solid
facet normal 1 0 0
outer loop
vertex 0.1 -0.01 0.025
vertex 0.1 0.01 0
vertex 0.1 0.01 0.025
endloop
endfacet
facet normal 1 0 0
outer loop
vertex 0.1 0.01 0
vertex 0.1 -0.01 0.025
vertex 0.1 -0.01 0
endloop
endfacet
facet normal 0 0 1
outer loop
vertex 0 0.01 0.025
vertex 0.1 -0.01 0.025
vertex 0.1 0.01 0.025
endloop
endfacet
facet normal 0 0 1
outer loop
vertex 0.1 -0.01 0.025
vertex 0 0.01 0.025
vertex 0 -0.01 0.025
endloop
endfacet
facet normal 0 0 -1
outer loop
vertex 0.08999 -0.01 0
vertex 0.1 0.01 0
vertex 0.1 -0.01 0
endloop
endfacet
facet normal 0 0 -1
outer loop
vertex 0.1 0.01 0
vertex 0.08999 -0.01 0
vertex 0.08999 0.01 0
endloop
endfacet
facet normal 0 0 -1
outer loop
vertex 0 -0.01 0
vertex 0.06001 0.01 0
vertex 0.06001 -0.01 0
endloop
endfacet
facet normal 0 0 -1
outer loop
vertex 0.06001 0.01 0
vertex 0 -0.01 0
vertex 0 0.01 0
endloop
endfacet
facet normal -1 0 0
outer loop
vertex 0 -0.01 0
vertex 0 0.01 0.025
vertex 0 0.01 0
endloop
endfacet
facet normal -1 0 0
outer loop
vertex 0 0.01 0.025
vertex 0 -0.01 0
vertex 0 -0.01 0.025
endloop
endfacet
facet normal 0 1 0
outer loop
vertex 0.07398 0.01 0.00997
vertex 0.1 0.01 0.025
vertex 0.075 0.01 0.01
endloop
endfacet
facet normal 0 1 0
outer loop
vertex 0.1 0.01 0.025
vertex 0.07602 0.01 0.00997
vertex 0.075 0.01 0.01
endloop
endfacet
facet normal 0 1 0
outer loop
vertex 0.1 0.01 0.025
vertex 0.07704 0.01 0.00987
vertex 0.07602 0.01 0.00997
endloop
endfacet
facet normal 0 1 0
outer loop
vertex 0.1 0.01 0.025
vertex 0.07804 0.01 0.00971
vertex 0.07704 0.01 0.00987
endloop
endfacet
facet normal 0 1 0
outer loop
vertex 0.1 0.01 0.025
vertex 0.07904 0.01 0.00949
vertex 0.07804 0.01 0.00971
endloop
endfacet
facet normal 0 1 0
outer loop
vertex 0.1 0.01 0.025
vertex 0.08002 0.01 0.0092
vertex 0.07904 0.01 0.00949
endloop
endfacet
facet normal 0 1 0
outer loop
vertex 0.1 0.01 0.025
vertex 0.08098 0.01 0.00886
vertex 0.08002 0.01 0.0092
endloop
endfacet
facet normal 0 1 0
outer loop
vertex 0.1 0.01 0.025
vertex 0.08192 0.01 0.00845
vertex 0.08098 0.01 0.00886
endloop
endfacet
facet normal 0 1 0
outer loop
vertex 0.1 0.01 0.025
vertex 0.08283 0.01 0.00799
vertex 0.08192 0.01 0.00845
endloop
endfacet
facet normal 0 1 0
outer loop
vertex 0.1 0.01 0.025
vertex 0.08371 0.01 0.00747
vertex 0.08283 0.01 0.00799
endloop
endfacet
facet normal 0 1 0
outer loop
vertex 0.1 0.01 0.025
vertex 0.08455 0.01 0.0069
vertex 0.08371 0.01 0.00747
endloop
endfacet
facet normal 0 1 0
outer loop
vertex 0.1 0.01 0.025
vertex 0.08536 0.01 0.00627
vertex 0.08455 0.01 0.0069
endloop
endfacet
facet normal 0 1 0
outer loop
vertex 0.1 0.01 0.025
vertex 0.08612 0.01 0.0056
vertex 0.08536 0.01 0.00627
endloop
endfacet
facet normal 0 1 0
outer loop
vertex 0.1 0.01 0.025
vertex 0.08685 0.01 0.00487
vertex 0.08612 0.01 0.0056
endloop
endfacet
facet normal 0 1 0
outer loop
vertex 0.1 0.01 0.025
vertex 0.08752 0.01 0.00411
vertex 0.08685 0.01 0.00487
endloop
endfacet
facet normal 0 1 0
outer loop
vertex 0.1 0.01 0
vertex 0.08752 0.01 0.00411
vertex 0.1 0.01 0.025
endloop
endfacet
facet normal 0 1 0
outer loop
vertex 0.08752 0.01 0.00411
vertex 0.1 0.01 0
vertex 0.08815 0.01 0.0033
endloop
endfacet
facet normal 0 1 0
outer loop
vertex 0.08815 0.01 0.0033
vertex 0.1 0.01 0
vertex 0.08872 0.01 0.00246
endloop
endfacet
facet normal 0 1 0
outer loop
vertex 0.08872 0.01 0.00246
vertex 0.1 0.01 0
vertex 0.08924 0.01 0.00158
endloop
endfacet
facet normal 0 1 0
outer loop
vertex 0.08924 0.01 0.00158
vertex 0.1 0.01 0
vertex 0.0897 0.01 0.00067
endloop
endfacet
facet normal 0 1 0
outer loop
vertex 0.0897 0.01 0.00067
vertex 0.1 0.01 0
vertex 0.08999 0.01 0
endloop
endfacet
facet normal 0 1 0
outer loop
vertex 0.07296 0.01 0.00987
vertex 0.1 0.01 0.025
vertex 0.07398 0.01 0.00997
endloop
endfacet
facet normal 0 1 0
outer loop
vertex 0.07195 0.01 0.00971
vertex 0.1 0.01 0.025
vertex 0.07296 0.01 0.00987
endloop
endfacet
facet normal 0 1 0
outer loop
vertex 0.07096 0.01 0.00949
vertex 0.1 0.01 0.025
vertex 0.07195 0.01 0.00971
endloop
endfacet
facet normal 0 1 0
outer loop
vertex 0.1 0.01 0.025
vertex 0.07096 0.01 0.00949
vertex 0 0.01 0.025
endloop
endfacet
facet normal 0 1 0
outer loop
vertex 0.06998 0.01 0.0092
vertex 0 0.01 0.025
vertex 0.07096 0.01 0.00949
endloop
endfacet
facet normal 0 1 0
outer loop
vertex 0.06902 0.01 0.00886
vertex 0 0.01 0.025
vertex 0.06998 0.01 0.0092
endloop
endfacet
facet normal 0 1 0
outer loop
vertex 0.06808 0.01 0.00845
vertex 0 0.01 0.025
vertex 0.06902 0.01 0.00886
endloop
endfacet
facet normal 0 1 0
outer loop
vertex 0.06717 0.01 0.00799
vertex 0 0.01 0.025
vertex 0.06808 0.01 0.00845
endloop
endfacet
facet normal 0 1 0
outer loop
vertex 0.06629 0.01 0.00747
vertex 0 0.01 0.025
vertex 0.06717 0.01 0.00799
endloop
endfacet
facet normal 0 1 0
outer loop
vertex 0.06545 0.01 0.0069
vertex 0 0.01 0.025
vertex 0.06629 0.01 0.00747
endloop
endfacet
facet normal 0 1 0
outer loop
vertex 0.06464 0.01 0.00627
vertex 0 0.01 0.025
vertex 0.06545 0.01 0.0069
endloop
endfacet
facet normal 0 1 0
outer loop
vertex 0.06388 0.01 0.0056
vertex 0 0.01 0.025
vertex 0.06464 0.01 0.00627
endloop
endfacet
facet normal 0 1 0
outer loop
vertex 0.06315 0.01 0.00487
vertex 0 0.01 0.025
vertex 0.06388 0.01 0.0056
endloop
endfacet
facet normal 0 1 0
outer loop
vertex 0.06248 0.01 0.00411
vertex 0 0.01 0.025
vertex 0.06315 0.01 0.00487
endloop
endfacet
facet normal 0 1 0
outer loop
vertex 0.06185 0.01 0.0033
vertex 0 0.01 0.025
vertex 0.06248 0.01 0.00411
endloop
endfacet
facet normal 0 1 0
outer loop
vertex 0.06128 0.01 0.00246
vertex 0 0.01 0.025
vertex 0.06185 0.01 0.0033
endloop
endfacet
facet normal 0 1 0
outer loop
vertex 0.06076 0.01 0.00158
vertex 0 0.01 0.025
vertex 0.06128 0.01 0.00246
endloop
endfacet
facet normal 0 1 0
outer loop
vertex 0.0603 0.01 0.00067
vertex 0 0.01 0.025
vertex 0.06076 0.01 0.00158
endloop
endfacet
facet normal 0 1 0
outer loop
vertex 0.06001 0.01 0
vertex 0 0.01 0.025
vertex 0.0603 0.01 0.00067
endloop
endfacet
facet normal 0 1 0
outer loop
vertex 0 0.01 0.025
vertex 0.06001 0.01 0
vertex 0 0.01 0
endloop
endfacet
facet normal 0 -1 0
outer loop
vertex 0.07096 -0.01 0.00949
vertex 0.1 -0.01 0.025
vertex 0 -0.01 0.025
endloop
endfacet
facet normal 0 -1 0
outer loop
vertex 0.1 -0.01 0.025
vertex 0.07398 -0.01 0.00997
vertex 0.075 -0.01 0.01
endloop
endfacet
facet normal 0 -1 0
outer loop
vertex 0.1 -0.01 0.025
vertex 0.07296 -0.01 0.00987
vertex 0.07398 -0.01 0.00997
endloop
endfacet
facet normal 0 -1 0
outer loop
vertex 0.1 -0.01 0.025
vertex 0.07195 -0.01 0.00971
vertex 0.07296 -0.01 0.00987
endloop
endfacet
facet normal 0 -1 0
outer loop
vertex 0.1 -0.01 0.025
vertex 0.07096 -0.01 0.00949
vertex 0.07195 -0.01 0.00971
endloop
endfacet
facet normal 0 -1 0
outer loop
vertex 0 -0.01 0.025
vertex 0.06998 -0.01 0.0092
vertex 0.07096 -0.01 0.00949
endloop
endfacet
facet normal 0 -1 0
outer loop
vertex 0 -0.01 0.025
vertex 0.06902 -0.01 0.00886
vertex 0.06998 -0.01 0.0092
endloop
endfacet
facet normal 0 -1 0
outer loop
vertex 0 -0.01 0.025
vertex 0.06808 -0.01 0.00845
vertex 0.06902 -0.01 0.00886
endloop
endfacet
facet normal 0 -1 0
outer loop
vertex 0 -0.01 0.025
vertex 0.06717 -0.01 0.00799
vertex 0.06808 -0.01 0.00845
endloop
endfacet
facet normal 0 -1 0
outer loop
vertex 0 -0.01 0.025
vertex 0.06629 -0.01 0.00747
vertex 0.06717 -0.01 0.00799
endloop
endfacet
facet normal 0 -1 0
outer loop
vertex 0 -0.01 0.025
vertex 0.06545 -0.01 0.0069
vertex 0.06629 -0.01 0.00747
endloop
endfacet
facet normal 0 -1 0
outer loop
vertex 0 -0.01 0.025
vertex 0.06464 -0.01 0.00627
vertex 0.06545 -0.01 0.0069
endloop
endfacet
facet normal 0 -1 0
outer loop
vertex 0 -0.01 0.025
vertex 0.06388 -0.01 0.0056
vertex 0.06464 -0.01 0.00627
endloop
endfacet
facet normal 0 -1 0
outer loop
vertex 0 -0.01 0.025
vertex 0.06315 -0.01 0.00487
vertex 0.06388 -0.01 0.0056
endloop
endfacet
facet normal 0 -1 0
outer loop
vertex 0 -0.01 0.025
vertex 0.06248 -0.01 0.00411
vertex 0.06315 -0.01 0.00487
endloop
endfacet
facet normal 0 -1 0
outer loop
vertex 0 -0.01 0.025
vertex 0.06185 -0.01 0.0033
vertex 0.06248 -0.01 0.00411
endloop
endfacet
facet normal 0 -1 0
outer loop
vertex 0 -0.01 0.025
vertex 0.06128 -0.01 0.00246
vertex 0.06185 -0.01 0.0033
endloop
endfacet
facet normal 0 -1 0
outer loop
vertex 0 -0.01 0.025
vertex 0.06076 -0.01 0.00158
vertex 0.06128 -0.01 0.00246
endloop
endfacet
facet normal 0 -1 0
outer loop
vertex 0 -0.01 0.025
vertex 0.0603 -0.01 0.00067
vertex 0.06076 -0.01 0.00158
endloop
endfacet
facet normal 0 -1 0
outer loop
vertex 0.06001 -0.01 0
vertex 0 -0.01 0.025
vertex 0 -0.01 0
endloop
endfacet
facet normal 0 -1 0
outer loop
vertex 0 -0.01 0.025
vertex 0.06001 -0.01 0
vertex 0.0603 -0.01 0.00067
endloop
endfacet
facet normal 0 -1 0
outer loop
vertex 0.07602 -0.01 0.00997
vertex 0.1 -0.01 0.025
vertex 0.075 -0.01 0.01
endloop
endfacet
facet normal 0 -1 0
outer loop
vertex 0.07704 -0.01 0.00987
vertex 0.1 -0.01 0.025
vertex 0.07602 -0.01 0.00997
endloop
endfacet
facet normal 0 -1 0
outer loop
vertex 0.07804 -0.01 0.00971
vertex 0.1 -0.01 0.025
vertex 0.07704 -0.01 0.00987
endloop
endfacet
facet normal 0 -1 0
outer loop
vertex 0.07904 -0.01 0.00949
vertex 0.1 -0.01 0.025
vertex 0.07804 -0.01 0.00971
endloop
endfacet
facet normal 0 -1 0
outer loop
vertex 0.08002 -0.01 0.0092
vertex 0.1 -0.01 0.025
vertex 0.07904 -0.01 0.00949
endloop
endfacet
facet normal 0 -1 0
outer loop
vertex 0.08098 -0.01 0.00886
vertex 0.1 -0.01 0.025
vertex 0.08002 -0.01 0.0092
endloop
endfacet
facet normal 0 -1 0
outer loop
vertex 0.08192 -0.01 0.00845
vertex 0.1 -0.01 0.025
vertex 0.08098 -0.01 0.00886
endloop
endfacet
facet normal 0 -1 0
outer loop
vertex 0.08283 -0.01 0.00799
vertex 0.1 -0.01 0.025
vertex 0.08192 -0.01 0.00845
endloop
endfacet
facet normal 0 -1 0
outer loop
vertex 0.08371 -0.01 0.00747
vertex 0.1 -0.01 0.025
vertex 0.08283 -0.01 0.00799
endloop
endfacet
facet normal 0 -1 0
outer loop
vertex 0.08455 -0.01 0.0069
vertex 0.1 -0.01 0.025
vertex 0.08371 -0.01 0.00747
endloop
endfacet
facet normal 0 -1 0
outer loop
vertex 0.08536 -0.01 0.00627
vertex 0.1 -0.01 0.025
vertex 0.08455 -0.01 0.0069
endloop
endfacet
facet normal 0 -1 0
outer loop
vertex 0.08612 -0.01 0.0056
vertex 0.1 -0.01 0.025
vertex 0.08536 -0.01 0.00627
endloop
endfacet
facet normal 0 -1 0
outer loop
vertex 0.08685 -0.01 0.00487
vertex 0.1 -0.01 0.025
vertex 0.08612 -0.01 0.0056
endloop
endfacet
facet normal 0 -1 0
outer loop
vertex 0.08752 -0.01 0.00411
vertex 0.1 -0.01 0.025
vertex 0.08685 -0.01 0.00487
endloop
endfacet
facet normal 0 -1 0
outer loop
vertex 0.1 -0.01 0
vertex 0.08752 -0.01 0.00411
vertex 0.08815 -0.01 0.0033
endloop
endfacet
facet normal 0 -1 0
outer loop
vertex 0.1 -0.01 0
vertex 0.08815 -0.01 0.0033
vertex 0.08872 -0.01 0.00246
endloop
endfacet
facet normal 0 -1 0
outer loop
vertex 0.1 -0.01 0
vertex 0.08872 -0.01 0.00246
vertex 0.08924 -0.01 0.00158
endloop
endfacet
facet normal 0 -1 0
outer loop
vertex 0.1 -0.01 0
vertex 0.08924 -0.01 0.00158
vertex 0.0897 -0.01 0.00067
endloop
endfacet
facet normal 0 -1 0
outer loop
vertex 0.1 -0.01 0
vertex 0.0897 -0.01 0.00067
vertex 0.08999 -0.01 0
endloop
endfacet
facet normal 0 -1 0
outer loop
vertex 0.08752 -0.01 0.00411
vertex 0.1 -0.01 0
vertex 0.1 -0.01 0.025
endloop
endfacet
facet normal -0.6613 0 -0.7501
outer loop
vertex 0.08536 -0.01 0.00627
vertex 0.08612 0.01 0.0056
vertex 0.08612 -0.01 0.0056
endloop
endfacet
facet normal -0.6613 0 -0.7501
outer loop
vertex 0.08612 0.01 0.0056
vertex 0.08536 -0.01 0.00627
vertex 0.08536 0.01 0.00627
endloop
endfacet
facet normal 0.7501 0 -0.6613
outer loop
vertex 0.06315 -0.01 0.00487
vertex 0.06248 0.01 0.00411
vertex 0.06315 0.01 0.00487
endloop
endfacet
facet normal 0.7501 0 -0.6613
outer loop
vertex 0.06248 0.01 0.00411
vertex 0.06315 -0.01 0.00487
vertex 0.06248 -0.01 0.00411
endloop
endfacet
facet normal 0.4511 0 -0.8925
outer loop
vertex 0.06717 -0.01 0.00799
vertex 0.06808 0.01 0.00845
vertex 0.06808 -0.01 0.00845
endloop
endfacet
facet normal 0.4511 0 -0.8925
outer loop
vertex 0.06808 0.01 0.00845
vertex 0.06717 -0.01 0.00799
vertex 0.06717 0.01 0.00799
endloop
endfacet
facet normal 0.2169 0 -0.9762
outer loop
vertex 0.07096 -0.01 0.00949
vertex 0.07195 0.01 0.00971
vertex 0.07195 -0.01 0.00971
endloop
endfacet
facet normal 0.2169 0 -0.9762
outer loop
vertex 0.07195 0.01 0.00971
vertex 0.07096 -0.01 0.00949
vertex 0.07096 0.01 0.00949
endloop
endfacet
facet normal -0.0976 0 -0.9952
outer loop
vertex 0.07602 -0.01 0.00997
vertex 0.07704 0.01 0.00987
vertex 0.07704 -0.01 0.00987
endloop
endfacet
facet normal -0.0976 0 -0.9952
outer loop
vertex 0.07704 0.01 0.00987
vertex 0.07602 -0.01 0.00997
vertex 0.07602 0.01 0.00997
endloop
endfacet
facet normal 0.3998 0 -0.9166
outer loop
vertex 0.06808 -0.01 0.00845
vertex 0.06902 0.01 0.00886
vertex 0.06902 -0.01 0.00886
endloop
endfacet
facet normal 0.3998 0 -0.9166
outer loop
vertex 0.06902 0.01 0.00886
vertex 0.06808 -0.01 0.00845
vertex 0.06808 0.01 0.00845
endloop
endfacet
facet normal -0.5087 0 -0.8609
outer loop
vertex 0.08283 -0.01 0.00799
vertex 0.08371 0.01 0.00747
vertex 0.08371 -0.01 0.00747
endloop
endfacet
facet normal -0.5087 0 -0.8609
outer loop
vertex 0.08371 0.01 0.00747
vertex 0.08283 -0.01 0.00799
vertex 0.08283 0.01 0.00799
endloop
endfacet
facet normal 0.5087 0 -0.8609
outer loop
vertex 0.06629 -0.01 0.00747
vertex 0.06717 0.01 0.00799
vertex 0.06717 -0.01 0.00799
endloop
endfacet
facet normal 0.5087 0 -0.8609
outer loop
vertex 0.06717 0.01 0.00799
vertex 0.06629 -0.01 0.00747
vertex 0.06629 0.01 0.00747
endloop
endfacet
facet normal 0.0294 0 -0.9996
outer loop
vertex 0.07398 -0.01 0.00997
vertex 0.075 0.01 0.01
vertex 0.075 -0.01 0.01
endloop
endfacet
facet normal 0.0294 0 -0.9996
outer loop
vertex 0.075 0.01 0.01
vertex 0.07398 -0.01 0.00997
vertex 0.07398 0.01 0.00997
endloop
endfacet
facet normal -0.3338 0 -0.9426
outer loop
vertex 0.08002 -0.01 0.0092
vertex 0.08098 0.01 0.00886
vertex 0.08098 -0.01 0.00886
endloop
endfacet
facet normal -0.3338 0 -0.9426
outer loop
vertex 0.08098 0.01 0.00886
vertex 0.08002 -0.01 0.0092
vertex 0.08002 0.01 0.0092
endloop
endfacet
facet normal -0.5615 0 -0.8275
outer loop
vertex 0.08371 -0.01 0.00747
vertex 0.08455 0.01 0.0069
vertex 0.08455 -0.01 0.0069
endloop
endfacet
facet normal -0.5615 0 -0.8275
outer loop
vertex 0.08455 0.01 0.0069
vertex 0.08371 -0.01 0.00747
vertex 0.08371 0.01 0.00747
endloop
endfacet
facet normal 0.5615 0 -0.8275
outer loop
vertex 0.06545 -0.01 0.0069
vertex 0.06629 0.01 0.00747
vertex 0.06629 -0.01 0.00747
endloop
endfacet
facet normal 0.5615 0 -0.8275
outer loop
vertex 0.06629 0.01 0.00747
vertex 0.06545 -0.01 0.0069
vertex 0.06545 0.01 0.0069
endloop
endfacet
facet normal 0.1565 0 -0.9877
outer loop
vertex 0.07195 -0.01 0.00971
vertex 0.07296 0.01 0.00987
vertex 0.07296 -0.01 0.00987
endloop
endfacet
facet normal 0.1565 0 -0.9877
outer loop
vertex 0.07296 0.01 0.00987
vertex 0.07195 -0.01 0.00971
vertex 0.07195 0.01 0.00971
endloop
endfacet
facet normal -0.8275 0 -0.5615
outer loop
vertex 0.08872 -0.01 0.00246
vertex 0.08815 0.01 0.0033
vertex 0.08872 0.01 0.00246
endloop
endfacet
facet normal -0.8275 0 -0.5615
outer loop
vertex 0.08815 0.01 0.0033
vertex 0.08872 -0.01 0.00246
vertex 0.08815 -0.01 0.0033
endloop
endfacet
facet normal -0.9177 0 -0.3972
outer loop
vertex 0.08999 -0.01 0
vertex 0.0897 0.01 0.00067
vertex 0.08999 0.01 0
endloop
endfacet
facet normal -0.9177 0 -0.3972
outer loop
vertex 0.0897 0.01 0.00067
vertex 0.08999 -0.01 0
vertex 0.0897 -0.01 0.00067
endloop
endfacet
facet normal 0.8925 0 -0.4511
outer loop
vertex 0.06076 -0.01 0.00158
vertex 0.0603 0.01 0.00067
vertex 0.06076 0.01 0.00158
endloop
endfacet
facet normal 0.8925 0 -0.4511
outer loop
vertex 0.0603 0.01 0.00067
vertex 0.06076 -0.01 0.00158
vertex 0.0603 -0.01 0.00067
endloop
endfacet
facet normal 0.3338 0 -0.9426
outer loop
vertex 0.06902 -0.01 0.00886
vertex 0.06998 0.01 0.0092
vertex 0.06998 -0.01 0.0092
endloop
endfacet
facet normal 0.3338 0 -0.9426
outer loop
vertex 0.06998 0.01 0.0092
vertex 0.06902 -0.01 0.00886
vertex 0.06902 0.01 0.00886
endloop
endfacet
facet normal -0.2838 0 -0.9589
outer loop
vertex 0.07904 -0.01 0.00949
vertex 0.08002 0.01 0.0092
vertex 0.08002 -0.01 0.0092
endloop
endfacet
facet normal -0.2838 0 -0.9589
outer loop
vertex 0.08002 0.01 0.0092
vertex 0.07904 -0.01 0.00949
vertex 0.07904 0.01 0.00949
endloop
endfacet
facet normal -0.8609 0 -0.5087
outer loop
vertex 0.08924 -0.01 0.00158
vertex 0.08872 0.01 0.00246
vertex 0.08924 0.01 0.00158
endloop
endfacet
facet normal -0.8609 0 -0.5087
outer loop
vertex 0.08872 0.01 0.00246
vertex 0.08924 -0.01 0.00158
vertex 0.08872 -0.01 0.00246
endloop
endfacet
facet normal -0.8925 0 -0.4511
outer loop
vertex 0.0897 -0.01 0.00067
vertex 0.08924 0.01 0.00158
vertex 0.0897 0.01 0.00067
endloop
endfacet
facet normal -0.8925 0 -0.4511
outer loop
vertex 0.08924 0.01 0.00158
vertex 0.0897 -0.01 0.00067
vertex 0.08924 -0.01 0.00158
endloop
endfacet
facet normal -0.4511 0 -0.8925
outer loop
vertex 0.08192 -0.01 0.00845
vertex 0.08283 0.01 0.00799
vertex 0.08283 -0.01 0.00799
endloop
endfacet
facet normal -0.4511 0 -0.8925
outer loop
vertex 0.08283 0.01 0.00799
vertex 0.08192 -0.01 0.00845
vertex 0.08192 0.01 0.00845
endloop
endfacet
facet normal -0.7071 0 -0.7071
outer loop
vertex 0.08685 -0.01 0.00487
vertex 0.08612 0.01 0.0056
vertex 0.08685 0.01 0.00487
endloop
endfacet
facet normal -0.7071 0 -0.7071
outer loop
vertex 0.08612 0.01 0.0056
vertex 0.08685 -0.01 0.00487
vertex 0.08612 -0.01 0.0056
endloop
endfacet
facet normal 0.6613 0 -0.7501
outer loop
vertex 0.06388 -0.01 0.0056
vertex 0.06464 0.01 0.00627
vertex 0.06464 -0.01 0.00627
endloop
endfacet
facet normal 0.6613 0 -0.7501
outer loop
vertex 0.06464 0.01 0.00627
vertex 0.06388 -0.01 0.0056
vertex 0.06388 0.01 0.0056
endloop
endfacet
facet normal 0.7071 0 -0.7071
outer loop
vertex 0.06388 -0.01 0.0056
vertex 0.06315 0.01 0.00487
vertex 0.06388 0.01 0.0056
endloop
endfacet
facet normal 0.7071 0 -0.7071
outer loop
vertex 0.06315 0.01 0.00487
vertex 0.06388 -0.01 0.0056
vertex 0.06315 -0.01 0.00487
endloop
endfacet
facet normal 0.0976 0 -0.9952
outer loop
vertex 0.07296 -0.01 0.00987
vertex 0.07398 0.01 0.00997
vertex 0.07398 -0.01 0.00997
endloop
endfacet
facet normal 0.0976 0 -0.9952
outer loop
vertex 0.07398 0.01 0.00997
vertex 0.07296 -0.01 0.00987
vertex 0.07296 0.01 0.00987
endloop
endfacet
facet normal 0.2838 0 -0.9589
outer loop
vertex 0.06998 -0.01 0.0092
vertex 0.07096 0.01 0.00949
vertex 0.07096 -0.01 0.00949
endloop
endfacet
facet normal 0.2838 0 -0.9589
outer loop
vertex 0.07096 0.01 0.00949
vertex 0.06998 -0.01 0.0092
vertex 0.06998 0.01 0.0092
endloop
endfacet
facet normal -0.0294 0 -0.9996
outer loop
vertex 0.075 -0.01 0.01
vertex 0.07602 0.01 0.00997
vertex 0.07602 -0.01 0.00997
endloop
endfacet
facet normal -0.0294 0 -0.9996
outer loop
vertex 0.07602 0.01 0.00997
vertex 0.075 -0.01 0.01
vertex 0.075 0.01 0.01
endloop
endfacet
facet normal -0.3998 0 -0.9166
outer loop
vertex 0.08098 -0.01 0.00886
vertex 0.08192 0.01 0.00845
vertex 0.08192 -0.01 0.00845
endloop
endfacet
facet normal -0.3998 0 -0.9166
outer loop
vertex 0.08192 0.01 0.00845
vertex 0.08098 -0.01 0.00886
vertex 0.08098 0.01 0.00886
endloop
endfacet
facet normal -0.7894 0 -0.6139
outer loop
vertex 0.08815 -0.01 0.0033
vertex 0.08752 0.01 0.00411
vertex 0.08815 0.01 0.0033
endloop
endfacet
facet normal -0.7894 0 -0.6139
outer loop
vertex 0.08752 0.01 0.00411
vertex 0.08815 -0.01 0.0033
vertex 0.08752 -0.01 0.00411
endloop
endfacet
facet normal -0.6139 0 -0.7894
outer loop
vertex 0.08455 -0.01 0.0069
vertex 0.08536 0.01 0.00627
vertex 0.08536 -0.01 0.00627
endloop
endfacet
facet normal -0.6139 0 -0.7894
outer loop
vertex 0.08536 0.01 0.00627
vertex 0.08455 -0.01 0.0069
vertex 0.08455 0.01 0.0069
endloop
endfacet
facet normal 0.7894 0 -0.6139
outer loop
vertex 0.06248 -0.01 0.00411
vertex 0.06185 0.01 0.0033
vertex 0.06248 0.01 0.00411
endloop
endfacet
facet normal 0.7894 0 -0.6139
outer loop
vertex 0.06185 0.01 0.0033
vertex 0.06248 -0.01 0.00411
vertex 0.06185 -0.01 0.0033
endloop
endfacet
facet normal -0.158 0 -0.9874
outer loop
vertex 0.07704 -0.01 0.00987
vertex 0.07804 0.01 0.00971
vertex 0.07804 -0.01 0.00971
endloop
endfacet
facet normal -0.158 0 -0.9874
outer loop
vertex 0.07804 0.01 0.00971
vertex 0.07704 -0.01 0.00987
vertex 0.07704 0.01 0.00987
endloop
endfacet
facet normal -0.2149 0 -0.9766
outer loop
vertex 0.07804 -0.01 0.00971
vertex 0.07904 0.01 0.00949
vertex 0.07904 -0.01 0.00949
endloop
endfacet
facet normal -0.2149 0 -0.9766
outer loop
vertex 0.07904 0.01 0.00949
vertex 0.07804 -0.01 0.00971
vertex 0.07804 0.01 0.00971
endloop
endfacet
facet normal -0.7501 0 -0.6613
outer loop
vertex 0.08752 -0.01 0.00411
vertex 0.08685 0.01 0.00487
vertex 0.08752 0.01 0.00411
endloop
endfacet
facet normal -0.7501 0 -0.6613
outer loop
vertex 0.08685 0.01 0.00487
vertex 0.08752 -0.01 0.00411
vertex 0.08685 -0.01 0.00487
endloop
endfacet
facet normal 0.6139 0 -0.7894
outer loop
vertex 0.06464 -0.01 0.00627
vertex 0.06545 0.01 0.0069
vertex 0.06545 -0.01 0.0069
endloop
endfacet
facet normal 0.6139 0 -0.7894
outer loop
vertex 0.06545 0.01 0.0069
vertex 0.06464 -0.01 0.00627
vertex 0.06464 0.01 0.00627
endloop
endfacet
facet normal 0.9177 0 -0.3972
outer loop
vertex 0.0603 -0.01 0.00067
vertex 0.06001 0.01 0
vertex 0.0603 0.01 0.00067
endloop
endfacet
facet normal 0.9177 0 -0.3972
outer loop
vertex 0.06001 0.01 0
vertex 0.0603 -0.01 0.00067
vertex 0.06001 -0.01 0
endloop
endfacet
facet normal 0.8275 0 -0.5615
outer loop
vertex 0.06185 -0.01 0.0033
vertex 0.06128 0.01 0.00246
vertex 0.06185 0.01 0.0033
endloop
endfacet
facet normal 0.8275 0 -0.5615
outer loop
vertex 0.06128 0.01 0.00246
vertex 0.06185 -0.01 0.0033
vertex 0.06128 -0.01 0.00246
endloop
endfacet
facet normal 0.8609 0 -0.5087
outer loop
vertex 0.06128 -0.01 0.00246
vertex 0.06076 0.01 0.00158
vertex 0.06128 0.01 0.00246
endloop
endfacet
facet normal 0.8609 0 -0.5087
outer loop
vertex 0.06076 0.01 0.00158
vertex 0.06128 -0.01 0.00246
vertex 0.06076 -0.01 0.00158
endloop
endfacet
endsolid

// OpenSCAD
/* A box finger with round cutout
 * The round cutout is parametrized by the diameter
 * equal to 'cutwidth' and the depth ('cutdepth')
 */

s = 1;

length = 0.1;
width = 0.025;
depth = 0.020;
chfdepth = 0;
chfangle = 45;
tcpoffset = 0.025;
cutpos = 0.0;
cutdepth = 0.01;
cutangle = 90;
cutwidth = 0.0325;
cuttilt = 0;

/* Produces basic box finger */
module basicShape(length, width, depth)
{
	translate([0, -depth/2, 0]) cube([length, depth, width]);
}

/* Produces the chamfering geometry.
 * length -- length of the finger
 * start_depth -- distance from the finger plane at which the chamfer starts
 * angle --- chamfering angle
 */
module chamfering(length, start_depth, angle) {
	size = 1000;

	translate([length, 0, start_depth])
		rotate([0, 90-angle, 0])
			translate([0, 0, size/2])
				cube(size, center = true);
}

/* Produces the geometry for the cutout.
 * cutpos -- position of the cutout
 * cutdepth -- depth of the cutout
 * cutangle -- the angle of the cutout
 * cuttilt -- the tilt of the cutout
 */
module cutout(cutpos, cutdepth, cutwidth, cuttilt) {
	size = 1000;

	s_x = tan(cutangle /2);

	translate([cutpos, 0, -cutwidth/2+cutdepth])
		rotate([0, 0, cuttilt])
			rotate([90, 0, 0])
				translate([0, 0, 0])
					cylinder(h = size, r = cutwidth/2, center = true, $fn = 100);
}

/* Produces the finger geometry.
 * Parameters...
 */
module finger(length, width, depth, chfdepth, chfangle, cutpos, cutdepth, cutwidth, cuttilt) {
	difference() {
		difference() {
			basicShape(length, width, depth);
			chamfering(length, width - width * chfdepth, chfangle);
		}
		cutout(cutpos, cutdepth, cutwidth, cuttilt);
	}
}

scale(s)
	finger(length, width, depth, chfdepth, chfangle, length-tcpoffset+cutpos, cutdepth, cutwidth, cuttilt);
